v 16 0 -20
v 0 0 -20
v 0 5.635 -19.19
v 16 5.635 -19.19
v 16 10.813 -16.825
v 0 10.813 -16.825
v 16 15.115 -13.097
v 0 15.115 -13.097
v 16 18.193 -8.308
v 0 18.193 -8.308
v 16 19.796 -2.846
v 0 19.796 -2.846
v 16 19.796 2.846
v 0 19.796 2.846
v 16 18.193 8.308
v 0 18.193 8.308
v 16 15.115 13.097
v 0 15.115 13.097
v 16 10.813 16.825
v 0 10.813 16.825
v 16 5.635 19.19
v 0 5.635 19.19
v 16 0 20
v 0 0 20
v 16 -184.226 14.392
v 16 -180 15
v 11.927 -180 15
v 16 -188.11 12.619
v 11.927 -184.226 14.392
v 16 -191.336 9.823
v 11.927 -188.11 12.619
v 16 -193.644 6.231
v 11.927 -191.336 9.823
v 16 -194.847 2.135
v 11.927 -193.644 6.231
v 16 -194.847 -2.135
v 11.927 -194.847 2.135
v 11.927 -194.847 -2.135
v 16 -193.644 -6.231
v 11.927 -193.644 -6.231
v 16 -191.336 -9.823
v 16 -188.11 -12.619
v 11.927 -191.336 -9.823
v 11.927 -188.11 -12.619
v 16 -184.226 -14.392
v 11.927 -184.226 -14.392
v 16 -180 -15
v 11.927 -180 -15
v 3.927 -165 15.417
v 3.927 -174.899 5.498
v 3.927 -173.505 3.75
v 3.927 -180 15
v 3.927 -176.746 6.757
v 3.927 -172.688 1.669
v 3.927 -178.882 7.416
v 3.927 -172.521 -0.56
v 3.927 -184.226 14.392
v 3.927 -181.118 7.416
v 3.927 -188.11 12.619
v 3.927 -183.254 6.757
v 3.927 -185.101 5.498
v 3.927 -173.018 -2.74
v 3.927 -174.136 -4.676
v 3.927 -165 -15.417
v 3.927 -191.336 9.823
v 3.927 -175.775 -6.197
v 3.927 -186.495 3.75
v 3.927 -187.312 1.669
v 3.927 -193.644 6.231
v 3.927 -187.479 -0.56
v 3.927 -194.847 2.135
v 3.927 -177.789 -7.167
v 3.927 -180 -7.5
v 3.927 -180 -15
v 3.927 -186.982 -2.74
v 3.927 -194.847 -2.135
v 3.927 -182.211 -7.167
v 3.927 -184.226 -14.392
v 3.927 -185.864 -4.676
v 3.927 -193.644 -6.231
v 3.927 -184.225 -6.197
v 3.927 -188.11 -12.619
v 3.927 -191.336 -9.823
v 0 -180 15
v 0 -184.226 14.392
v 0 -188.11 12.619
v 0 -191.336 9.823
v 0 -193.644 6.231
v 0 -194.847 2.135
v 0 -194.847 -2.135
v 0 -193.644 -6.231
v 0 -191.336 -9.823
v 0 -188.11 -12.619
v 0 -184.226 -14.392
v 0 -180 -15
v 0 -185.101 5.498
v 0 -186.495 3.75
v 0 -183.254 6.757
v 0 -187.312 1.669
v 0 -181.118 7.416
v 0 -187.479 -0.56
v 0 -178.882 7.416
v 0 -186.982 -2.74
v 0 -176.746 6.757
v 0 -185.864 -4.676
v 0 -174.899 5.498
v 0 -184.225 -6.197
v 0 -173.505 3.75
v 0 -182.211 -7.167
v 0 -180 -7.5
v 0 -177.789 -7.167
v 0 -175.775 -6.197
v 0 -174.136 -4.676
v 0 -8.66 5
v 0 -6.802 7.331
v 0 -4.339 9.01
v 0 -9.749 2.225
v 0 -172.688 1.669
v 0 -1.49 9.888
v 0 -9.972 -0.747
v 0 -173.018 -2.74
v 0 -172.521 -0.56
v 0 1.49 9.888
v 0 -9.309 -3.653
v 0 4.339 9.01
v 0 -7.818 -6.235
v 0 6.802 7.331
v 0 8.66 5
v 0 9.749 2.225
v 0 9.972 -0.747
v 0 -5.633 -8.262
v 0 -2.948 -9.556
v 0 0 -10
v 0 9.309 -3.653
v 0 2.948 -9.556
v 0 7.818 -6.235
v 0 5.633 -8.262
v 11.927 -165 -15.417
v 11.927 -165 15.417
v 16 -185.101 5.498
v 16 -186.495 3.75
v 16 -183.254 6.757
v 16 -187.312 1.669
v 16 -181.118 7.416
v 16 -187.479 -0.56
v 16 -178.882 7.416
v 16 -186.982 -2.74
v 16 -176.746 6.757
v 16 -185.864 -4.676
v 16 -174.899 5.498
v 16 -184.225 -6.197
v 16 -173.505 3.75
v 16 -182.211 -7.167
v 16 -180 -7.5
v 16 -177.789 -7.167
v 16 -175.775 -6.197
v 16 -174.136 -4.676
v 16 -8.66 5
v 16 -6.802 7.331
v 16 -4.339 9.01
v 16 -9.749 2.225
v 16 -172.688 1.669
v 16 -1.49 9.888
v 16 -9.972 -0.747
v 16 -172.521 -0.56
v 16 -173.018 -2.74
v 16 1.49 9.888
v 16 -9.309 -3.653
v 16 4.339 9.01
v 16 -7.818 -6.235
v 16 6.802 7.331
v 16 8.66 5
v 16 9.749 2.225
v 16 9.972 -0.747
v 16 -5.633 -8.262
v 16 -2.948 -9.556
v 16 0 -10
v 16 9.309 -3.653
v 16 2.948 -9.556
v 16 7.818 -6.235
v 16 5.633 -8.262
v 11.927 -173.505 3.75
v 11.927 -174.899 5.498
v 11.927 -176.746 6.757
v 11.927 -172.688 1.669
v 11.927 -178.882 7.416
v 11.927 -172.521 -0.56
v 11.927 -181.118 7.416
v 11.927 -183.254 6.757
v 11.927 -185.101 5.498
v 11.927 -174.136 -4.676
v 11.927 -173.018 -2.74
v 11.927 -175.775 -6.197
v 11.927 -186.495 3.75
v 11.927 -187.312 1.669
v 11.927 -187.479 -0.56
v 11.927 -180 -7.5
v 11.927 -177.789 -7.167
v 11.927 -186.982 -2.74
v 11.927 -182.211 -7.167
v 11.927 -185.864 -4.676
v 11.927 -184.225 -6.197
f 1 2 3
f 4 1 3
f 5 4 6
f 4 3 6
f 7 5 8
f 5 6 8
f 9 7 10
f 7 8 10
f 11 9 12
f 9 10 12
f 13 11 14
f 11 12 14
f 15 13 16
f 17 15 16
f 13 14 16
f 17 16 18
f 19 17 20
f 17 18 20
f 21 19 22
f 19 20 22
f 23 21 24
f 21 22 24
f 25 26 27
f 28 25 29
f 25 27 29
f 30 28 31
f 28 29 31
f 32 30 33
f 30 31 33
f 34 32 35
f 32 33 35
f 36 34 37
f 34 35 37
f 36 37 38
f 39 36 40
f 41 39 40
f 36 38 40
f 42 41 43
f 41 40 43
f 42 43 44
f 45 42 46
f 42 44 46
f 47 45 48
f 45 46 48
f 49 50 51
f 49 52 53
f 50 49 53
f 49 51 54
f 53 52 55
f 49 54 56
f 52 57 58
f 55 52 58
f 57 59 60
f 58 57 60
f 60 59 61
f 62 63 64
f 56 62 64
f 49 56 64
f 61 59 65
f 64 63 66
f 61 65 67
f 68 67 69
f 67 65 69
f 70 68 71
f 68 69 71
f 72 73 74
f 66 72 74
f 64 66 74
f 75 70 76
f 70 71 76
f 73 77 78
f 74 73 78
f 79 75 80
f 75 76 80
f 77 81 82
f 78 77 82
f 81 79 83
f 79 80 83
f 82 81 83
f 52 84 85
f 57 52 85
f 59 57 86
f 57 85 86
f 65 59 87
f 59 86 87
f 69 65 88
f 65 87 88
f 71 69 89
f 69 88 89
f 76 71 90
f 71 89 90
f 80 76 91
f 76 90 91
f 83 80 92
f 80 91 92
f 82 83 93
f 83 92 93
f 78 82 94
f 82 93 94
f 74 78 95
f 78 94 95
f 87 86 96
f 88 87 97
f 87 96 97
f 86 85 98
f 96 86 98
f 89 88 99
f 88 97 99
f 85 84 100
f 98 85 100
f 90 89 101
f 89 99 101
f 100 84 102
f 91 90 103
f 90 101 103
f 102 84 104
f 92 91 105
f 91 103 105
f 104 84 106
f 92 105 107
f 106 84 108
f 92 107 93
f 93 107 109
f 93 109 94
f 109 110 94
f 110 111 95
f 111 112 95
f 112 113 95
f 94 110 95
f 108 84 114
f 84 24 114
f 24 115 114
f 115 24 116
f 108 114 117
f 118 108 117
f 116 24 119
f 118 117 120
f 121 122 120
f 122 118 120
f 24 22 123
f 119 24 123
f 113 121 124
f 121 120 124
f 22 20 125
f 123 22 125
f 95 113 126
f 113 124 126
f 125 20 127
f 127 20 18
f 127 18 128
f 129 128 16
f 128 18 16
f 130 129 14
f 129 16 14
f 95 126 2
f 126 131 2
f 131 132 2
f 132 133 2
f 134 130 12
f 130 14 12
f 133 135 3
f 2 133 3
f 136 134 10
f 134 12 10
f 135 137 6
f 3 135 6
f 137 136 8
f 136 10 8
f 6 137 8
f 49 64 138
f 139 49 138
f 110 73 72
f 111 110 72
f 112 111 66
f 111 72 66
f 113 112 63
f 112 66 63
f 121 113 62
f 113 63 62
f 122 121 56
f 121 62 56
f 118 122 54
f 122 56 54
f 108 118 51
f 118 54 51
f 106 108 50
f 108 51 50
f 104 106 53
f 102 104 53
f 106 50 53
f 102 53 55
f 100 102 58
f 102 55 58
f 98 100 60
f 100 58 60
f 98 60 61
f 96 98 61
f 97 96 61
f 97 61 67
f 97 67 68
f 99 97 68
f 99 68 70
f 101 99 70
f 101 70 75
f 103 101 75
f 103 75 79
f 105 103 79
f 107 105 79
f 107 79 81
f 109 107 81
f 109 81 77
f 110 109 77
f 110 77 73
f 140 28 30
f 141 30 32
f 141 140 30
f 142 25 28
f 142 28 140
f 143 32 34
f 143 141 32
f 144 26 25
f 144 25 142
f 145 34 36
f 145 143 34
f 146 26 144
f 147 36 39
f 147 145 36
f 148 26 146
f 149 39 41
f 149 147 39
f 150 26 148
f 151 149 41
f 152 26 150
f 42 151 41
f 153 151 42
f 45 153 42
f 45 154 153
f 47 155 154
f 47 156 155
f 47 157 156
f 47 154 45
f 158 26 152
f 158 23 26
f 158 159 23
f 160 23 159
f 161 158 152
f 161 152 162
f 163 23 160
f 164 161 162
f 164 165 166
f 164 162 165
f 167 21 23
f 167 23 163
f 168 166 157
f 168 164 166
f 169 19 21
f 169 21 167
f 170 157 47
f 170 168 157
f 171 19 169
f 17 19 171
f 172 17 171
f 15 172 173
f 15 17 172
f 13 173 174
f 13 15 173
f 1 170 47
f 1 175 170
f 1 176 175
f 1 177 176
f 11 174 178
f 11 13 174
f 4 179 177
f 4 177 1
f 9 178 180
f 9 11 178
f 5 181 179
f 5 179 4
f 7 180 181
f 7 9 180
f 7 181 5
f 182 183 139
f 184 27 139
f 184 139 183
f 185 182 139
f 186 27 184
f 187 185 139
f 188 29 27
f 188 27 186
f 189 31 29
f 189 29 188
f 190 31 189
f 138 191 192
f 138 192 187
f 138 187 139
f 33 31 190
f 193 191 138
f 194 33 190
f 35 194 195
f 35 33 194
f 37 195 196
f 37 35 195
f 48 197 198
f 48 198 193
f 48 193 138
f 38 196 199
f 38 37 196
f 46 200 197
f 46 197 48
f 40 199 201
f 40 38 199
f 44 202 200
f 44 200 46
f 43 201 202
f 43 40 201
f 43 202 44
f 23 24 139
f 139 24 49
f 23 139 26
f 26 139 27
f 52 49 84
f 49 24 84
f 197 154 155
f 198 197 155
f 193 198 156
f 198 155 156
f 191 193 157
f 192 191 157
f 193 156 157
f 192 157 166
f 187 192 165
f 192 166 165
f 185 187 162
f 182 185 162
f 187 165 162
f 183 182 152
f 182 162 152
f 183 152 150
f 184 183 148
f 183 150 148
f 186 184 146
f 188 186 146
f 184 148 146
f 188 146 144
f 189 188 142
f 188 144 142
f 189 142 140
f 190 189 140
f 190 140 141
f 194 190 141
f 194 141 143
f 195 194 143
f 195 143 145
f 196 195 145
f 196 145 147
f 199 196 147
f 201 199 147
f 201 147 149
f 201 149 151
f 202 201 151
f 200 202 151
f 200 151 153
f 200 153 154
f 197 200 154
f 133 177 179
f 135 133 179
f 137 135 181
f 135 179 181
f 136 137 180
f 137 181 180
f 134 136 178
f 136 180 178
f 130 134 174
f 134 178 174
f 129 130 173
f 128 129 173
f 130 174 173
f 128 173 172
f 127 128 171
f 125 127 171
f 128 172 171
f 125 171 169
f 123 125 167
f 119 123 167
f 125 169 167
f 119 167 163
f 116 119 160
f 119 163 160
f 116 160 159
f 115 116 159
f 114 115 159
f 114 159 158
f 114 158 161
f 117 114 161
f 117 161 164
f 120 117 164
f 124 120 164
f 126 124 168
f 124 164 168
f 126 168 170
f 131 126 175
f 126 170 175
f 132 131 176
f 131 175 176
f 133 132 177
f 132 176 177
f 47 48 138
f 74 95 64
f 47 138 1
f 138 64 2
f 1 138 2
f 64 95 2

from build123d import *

# Parameters (mm, degrees)
EXTRUDE_1_DEPTH     = 16
SKETCH_2_R          = 10
SKETCH_2_R_2        = 7.5
CUT_EXTRUDE_1_DEPTH = 16
SKETCH_3_W          = 8
SKETCH_3_H          = 40
CUT_EXTRUDE_2_DEPTH = 65


with BuildPart() as part:
    # 草图1 → 凸台-拉伸1 (new body)
    with BuildSketch(Plane(origin=(0, 0, 0), x_dir=(0, 0, -1), z_dir=(1, 0, 0))):
        with BuildLine():
            ThreePointArc((20, 0), (0, 20), (-20, 0))
            Line((-20, 0), (-15, -180))
            ThreePointArc((-15, -180), (0, -195), (15, -180))
            Line((15, -180), (20, 0))
        make_face()
    extrude(amount=EXTRUDE_1_DEPTH)

    # 草图2 → 切除-拉伸1 (cut)
    with BuildSketch(Plane(origin=(16, 0, 0), x_dir=(0, 0, -1), z_dir=(1, 0, 0))):
        Circle(SKETCH_2_R)
        with Locations((0, -180)):
            Circle(SKETCH_2_R_2)
    extrude(amount=-CUT_EXTRUDE_1_DEPTH, mode=Mode.SUBTRACT)

    # 草图3 → 切除-拉伸2 (cut)
    with BuildSketch(Plane(origin=(0, -230, 0), x_dir=(1, 0, 0), z_dir=(0, 1, 0))):
        with Locations((7.927431522, 0)):
            Rectangle(SKETCH_3_W, SKETCH_3_H)
    extrude(amount=CUT_EXTRUDE_2_DEPTH, mode=Mode.SUBTRACT)


solid = part.part
